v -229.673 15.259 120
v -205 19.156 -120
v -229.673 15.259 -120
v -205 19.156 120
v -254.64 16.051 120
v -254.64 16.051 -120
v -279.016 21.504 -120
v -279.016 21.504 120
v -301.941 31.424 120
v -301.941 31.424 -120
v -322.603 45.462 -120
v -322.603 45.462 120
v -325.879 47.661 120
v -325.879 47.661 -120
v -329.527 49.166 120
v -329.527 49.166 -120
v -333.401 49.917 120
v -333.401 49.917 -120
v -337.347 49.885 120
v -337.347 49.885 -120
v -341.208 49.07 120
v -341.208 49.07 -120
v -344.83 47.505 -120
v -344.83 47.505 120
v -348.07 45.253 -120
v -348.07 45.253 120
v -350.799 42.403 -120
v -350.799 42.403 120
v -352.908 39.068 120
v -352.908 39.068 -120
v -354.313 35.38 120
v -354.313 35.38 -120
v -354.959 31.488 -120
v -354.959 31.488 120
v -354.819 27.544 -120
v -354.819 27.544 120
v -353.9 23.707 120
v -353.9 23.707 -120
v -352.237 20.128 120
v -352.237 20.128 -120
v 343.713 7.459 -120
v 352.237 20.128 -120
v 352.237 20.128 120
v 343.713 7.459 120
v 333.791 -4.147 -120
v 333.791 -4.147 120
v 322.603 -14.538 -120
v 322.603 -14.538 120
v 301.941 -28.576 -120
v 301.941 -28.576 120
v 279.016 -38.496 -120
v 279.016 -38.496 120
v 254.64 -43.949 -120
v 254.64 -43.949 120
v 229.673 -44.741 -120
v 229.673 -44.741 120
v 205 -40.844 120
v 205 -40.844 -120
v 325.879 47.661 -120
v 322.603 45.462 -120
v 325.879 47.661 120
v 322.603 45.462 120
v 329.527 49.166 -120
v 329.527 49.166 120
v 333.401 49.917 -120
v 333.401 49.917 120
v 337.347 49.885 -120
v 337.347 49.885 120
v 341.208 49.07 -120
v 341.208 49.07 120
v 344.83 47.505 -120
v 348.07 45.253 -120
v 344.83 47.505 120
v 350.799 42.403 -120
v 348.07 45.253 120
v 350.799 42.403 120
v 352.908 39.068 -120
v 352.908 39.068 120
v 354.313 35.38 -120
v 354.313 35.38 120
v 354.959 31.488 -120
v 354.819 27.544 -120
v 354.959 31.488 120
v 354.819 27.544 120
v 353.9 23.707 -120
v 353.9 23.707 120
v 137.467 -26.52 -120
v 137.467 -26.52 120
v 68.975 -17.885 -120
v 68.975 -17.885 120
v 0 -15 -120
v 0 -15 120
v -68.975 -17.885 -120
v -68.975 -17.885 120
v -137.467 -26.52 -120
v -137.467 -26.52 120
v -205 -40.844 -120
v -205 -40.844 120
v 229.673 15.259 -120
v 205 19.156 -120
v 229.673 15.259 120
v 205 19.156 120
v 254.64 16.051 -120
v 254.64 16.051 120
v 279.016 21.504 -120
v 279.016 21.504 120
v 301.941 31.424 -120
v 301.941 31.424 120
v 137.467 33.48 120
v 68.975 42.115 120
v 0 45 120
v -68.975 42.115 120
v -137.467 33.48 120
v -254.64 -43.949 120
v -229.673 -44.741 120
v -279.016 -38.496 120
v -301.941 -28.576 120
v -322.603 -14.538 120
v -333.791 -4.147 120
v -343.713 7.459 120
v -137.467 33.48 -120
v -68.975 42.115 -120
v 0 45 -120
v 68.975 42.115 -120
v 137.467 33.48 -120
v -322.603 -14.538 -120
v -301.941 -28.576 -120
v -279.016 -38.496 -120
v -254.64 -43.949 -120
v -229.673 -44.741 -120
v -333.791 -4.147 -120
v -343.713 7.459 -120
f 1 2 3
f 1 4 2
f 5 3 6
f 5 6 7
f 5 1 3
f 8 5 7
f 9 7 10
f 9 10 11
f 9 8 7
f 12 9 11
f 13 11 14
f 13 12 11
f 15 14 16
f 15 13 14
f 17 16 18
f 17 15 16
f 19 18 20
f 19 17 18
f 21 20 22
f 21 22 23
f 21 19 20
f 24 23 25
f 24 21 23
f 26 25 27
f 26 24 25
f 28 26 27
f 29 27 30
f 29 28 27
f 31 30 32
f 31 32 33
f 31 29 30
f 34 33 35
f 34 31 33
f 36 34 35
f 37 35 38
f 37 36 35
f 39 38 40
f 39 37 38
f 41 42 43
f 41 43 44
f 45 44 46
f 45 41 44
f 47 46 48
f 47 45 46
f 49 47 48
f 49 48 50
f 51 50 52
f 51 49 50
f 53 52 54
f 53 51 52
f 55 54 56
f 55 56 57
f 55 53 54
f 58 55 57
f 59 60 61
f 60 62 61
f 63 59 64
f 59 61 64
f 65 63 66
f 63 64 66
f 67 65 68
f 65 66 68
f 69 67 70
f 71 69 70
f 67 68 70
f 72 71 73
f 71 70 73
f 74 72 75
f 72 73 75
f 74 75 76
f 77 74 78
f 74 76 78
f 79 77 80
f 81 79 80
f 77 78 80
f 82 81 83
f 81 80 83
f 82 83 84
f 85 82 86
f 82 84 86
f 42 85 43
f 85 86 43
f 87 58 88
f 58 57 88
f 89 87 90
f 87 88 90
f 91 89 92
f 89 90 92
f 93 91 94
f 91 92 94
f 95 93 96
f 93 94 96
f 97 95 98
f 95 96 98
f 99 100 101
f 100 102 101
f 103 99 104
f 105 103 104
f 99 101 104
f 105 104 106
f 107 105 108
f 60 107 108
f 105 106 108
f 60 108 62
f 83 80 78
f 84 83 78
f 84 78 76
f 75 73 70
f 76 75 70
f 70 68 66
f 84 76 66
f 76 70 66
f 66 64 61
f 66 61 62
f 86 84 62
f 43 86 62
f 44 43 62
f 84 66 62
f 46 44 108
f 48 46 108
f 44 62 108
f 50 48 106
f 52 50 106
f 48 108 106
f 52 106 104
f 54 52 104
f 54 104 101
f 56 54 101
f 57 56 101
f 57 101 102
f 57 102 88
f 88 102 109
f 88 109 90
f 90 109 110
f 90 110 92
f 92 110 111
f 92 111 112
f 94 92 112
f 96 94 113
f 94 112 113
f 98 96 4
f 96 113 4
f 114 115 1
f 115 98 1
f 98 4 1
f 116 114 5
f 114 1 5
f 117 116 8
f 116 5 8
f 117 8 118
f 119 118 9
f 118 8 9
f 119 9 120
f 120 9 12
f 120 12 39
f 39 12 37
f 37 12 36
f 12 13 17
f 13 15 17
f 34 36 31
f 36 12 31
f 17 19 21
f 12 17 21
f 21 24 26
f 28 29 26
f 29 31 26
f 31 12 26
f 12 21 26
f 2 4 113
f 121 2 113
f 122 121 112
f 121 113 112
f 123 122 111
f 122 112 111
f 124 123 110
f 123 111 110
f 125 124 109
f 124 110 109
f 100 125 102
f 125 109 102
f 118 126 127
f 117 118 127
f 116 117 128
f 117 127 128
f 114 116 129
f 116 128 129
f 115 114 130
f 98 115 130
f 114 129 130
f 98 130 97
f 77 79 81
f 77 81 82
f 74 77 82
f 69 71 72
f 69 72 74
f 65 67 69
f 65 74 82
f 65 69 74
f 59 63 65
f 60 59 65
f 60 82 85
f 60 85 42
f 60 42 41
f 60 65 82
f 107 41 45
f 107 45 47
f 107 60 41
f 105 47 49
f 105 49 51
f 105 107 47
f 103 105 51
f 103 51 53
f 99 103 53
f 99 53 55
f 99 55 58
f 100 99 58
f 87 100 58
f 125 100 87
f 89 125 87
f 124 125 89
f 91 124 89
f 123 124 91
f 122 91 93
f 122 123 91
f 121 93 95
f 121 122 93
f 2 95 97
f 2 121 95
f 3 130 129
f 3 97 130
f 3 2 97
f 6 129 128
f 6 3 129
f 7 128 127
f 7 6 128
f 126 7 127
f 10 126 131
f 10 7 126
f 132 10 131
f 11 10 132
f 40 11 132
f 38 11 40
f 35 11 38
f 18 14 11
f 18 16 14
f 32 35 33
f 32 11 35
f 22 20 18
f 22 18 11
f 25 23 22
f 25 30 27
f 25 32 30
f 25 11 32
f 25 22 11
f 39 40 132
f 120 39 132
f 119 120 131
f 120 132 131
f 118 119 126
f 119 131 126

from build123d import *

# Parameters (mm, degrees)
AUFSATZ_LINEAR_AUSTRAGEN1_DEPTH = 120


with BuildPart() as part:
    # Skizze1 → Aufsatz-Linear austragen1 (new body, symmetric)
    with BuildSketch(Plane.XY):
        with BuildLine():
            Line((0, -15), (0, 45))
            ThreePointArc((0, 45), (-103.311330917, 38.513471526), (-205, 19.155766915))
            ThreePointArc((-205, 19.155766915), (-266.956521007, 18.203003185), (-322.60257584, 45.461668516))
            ThreePointArc((-322.60257584, 45.461668516), (-348.070218627, 45.253218096), (-352.237448898, 20.127962424))
            ThreePointArc((-352.237448898, 20.127962424), (-338.919122298, 1.513284408), (-322.60257584, -14.538331484))
            ThreePointArc((-322.60257584, -14.538331484), (-266.956521007, -41.796996815), (-205, -40.844233085))
            ThreePointArc((-205, -40.844233085), (-103.311330917, -21.486528474), (0, -15))
        make_face()
    aufsatz_linear_austragen1 = extrude(amount=AUFSATZ_LINEAR_AUSTRAGEN1_DEPTH, both=True)

    # Spiegeln1: Aufsatz-Linear austragen1 across plane
    add(aufsatz_linear_austragen1.mirror(Plane(origin=(0, 0, 120), x_dir=(0, 0, 1), z_dir=(1, 0, 0))))


solid = part.part
